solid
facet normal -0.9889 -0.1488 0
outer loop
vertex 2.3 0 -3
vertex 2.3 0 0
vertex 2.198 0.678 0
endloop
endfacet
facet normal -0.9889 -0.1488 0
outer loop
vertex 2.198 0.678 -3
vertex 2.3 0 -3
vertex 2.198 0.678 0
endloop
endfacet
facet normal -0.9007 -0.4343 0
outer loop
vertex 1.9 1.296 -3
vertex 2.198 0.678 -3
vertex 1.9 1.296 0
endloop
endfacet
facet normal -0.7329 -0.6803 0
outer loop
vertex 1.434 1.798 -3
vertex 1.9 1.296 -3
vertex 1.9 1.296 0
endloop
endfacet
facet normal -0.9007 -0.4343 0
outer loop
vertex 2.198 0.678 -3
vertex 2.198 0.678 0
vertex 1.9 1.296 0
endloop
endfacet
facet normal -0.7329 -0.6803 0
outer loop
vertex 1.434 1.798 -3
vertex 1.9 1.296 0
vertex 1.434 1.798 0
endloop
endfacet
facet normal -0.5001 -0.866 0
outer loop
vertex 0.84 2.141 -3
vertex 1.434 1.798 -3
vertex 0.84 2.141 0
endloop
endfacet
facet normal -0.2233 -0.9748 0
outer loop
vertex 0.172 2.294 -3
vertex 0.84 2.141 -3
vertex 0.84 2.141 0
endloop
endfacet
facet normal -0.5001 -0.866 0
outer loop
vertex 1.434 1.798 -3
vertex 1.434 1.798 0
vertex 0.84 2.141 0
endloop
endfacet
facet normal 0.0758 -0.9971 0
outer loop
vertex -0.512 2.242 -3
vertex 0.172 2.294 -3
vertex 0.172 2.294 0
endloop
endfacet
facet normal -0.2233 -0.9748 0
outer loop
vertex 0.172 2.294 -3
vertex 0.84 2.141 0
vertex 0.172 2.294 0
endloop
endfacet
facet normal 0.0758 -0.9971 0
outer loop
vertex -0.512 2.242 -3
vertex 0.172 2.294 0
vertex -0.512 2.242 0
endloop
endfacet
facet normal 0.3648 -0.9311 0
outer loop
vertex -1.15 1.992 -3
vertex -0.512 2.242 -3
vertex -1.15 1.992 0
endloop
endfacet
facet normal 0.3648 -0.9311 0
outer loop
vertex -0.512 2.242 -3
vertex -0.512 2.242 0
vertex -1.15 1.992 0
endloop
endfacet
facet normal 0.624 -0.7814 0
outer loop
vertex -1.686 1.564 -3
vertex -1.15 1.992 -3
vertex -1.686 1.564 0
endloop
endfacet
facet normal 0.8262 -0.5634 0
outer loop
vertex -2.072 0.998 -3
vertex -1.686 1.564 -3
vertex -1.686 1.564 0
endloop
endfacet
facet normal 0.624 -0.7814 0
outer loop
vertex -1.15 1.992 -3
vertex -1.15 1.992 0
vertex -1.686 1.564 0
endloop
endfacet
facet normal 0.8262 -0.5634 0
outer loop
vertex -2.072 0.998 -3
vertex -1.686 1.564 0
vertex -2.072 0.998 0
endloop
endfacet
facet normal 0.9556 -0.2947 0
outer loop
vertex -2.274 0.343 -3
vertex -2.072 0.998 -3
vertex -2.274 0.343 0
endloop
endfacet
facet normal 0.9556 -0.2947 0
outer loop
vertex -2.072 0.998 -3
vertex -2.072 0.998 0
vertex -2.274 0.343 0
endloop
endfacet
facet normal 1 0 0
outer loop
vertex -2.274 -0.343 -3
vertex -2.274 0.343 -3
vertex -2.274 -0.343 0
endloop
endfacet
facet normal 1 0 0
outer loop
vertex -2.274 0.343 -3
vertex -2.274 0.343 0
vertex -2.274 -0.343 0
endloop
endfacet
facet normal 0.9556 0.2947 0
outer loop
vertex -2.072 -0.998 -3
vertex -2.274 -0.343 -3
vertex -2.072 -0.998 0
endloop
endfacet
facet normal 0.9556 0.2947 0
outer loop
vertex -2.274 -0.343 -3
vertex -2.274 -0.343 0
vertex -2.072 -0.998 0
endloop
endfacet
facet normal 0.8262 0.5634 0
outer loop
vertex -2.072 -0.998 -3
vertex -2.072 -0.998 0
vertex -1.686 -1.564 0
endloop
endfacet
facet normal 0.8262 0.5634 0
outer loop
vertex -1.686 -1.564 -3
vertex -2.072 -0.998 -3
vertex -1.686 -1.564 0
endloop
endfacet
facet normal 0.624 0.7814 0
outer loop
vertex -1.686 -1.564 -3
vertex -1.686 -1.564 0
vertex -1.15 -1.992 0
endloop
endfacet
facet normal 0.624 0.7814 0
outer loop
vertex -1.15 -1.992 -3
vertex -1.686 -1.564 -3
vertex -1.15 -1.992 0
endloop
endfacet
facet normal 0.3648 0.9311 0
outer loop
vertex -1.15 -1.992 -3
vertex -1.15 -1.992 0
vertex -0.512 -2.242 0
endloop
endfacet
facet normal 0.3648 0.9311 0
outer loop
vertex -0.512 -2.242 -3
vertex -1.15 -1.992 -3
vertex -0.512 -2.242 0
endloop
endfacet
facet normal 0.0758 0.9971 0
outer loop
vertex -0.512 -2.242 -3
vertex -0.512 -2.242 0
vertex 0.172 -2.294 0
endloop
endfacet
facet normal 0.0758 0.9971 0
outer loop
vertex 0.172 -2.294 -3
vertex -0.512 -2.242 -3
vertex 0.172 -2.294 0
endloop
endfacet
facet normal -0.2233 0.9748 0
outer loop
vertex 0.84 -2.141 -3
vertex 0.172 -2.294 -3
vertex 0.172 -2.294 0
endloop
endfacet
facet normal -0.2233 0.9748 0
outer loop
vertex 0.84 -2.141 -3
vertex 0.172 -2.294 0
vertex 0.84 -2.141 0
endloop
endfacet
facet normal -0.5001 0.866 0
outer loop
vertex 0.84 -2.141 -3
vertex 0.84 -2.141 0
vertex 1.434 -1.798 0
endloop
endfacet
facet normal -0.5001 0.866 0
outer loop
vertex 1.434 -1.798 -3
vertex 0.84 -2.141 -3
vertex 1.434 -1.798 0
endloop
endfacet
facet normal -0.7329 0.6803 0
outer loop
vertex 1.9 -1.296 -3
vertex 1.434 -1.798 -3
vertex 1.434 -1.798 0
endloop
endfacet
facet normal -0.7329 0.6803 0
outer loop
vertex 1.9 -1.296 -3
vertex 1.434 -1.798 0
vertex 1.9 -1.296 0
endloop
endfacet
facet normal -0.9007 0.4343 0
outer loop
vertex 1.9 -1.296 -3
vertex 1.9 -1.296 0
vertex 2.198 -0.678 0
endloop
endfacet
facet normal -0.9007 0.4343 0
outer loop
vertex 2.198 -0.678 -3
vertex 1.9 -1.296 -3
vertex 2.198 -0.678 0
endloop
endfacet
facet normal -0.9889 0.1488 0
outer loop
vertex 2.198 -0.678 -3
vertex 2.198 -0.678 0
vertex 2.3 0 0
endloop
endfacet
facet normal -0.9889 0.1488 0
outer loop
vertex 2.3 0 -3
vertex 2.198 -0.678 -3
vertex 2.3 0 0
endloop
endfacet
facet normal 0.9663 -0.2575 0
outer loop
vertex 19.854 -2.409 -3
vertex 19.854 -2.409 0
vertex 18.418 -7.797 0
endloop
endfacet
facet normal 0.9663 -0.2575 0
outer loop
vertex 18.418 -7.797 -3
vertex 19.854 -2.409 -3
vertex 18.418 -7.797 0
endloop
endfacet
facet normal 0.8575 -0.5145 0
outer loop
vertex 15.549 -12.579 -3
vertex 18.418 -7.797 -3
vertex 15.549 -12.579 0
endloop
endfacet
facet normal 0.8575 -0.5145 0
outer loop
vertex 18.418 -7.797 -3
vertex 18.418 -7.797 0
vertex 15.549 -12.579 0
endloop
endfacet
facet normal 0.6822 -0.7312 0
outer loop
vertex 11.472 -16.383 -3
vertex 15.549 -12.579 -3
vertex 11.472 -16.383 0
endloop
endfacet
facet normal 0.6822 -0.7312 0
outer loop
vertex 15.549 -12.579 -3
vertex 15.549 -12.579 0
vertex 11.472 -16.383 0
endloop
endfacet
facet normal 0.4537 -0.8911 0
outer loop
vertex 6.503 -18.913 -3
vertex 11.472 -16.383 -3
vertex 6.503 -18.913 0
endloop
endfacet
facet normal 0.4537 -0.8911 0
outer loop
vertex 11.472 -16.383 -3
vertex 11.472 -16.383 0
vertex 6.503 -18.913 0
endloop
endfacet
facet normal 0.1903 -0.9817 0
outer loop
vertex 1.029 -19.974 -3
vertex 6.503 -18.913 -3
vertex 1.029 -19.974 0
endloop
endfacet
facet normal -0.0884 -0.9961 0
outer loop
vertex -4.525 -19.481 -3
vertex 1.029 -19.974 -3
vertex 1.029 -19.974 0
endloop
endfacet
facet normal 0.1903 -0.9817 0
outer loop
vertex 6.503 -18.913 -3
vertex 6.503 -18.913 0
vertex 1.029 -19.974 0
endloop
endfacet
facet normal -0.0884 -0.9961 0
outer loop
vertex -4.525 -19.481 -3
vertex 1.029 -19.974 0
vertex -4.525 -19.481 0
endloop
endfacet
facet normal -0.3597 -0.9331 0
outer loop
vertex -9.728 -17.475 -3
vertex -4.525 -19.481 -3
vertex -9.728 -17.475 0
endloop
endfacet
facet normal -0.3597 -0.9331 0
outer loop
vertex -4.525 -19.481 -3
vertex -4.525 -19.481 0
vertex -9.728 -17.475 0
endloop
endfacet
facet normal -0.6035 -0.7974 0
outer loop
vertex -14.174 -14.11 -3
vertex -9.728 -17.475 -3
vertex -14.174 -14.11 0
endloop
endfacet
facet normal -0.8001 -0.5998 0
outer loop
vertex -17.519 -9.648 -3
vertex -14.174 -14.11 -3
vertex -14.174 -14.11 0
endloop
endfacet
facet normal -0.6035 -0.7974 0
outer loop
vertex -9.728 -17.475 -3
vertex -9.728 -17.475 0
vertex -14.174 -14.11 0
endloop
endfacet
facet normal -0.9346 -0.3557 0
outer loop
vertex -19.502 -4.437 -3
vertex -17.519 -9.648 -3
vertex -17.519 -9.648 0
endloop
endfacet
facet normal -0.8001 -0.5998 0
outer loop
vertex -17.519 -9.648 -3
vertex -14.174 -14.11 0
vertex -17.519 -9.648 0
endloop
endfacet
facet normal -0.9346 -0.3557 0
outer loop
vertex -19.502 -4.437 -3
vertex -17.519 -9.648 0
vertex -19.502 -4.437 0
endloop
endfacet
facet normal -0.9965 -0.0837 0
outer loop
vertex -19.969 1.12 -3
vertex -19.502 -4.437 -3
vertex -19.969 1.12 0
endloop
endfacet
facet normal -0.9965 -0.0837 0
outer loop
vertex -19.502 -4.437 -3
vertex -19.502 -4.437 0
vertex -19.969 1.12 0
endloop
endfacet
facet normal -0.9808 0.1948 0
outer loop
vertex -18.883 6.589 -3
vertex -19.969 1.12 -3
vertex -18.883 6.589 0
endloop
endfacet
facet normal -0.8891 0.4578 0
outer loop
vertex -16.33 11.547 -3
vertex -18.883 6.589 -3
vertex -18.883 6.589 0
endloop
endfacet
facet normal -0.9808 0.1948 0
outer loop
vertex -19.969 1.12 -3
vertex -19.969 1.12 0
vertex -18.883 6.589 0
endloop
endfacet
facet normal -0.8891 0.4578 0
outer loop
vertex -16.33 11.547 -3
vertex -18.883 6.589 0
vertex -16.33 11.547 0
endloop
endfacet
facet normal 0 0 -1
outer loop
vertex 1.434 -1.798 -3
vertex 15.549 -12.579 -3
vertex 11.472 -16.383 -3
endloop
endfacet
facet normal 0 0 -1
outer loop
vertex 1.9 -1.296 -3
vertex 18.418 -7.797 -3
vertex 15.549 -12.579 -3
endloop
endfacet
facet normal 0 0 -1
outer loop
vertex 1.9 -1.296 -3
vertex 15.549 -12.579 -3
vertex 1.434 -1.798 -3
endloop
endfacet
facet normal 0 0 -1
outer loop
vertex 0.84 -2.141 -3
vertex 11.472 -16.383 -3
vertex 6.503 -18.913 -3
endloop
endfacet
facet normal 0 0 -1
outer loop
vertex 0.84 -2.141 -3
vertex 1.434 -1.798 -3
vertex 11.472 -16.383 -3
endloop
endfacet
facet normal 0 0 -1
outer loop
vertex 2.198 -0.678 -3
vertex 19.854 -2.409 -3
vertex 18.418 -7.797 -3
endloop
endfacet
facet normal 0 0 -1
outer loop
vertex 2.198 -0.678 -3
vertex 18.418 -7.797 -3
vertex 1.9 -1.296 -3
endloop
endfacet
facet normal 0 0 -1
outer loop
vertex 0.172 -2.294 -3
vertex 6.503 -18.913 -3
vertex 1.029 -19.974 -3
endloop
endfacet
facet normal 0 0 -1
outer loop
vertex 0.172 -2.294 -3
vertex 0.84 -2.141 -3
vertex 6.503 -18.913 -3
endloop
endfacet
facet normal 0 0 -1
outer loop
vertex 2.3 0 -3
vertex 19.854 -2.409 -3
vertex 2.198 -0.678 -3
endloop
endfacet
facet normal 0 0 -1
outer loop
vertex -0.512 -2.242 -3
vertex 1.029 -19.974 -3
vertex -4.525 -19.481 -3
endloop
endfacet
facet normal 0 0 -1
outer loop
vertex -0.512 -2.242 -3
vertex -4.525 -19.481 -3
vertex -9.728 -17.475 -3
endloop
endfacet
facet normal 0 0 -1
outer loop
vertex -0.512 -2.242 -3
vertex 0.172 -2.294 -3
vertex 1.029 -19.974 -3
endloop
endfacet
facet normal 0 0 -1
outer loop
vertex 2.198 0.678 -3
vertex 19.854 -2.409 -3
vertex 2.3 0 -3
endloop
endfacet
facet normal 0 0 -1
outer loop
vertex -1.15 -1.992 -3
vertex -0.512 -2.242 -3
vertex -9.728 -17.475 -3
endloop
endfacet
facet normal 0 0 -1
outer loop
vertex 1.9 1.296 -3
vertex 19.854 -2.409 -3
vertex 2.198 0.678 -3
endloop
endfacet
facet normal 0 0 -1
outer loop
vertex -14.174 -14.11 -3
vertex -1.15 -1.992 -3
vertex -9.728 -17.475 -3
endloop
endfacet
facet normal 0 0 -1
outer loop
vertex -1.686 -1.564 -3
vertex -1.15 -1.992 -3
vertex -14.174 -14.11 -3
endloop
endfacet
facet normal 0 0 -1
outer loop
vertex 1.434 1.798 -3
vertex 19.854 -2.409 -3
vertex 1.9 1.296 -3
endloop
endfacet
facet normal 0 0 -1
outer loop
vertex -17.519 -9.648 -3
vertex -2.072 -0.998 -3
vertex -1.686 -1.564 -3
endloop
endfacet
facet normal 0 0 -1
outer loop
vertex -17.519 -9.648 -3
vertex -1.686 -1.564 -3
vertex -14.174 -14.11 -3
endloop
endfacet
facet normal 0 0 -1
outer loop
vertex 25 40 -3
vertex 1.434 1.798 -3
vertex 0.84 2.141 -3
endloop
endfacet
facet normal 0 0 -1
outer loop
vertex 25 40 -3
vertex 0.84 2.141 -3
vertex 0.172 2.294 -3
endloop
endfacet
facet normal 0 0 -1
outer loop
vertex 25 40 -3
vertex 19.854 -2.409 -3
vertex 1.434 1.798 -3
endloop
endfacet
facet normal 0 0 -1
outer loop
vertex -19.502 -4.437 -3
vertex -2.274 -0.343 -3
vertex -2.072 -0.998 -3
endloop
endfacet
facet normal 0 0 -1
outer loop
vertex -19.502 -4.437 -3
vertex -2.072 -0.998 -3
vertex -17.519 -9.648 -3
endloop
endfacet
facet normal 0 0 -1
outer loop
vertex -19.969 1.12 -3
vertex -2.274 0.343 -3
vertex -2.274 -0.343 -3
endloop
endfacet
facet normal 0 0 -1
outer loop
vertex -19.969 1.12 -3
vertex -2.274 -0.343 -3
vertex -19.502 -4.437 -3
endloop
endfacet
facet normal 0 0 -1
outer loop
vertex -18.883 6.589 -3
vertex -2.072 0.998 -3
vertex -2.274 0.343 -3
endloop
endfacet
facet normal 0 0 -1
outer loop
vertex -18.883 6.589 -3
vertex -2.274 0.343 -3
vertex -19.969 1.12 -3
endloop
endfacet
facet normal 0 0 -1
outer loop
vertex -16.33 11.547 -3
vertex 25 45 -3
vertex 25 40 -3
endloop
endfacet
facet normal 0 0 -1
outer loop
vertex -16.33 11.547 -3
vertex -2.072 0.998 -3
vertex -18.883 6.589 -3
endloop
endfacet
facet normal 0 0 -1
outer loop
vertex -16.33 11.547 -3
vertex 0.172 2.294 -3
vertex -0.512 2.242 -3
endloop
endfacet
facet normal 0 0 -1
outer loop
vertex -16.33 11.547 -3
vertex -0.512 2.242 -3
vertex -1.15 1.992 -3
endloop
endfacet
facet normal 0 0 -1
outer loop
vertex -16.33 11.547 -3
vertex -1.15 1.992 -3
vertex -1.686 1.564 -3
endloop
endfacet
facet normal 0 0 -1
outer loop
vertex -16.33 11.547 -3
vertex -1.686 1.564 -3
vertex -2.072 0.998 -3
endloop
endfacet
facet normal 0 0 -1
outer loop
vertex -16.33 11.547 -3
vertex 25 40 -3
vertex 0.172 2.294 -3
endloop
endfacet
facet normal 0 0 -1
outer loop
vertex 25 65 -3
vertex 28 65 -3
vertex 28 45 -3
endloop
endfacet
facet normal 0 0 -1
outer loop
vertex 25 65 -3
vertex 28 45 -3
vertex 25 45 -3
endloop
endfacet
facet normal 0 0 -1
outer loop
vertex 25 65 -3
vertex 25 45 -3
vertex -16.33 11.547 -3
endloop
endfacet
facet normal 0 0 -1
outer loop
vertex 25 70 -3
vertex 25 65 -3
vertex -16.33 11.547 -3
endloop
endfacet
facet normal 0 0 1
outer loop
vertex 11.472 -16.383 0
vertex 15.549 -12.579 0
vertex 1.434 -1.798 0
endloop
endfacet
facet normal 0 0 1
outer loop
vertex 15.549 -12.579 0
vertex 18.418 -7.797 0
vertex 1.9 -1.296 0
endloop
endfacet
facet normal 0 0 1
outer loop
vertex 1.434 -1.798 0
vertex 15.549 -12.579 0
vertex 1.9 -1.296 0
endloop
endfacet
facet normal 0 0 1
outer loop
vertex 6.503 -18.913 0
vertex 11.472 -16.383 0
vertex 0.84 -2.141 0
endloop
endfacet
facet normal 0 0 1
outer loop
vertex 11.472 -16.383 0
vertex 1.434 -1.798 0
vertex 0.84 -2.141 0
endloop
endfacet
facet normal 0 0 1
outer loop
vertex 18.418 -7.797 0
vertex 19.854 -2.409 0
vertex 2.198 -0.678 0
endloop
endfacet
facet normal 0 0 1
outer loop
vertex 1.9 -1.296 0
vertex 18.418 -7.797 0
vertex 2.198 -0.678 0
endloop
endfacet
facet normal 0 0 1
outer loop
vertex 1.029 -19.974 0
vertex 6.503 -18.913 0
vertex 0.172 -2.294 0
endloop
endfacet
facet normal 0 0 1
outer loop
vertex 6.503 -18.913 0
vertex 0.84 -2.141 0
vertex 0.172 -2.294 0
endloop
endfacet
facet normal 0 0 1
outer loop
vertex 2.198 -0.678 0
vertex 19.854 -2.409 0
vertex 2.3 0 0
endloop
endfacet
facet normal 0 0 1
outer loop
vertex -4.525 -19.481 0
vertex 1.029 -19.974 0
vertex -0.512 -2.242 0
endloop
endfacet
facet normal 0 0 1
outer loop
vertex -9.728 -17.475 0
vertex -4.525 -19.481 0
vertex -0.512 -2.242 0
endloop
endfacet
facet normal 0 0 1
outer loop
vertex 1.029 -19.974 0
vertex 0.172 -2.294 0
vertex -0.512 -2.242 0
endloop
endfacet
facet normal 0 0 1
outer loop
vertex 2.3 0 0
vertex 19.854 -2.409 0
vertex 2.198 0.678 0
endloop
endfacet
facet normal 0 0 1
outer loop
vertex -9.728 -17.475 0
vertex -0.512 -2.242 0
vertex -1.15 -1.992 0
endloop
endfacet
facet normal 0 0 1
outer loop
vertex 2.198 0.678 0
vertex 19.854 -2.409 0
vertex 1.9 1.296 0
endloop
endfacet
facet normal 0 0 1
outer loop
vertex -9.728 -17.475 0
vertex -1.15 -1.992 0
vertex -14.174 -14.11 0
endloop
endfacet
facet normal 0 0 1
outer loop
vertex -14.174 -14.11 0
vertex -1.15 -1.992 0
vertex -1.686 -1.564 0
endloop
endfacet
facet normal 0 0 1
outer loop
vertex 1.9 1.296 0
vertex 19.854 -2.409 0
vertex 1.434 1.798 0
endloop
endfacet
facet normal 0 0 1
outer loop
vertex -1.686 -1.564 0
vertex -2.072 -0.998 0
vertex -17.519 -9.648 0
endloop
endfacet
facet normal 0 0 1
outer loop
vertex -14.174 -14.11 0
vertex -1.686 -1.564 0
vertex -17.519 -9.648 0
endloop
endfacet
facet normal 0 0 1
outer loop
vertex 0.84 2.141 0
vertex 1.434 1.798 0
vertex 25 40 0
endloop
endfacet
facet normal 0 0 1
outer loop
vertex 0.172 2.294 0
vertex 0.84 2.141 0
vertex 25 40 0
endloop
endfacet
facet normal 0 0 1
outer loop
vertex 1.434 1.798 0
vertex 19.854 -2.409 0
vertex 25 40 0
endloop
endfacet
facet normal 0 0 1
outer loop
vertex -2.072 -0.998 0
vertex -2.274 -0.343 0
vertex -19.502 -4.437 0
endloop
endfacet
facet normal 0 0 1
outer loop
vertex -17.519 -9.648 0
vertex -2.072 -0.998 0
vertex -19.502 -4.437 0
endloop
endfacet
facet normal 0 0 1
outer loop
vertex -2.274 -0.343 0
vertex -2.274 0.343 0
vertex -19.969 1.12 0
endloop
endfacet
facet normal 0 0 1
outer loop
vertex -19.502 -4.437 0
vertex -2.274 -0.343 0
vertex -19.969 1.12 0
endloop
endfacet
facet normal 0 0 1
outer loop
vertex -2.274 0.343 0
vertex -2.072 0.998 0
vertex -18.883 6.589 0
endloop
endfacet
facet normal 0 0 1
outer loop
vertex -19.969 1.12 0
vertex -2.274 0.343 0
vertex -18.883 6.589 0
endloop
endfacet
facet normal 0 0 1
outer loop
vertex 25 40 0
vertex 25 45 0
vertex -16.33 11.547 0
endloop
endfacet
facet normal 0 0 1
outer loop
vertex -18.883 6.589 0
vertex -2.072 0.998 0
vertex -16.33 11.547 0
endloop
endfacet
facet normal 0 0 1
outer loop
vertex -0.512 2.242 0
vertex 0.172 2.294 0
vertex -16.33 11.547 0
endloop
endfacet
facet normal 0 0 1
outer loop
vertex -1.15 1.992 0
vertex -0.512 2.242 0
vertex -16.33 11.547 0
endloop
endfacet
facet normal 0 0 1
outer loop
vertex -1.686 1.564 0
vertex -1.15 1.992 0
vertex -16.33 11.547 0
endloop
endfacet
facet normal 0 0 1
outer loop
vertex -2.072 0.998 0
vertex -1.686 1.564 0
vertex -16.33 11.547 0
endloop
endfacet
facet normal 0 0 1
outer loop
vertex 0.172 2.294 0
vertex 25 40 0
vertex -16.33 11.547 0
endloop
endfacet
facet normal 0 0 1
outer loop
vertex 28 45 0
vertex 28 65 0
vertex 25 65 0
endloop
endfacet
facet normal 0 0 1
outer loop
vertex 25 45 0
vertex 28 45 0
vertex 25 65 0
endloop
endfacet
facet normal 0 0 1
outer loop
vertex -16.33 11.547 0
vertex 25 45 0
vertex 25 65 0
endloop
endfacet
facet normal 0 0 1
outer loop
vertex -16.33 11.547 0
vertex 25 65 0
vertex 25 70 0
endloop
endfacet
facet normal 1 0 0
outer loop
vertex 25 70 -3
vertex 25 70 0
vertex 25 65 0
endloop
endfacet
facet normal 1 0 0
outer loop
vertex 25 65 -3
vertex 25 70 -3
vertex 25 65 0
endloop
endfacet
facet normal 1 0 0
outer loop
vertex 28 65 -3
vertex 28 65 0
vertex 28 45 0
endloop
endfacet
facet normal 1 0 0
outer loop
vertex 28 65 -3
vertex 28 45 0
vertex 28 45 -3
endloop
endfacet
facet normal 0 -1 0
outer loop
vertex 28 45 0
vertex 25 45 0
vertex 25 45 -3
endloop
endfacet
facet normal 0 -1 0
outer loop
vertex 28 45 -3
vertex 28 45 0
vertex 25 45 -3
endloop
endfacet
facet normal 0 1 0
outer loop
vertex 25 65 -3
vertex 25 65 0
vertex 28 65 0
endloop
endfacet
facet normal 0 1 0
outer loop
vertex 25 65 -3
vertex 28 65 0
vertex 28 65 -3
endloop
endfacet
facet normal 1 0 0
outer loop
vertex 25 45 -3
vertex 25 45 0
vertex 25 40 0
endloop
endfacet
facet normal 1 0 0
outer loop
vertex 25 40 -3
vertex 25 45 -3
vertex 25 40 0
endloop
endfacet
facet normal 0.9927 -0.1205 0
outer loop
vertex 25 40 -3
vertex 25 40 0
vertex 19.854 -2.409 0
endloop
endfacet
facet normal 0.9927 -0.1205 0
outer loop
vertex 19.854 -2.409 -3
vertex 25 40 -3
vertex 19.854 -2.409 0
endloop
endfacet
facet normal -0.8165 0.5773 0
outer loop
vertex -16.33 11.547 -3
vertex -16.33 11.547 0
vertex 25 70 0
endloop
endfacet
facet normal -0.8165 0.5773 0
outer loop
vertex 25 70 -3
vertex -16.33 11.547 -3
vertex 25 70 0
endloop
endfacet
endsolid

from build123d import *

# Parameters (mm, degrees)
BOSS_EXTRUDE1_DEPTH = 3
SKETCH2_R           = 2.3
CUT_EXTRUDE1_DEPTH  = 10
SKETCH4_W           = 3
SKETCH4_H           = 20
BOSS_EXTRUDE3_DEPTH = 3


with BuildPart() as part:
    # Sketch1 → Boss-Extrude1 (new body)
    with BuildSketch(Plane.XY):
        with BuildLine():
            Line((-16.33027103, 11.546525368), (25, 70))
            Line((25, 70), (25, 40))
            Line((25, 40), (19.854388756, -2.408992972))
            ThreePointArc((19.854388756, -2.408992972), (-7.196803073, -18.660279353), (-16.33027103, 11.546525368))
        make_face()
    extrude(amount=-BOSS_EXTRUDE1_DEPTH)

    # Sketch2 → Cut-Extrude1 (cut)
    with BuildSketch(Plane.XY):
        Circle(SKETCH2_R)
    extrude(amount=-CUT_EXTRUDE1_DEPTH, mode=Mode.SUBTRACT)

    # Sketch4 → Boss-Extrude3 (add)
    with BuildSketch(Plane(origin=(25, 0, 0), x_dir=(0, 0, -1), z_dir=(1, 0, 0))):
        with Locations((1.5, 55)):
            Rectangle(SKETCH4_W, SKETCH4_H)
    extrude(amount=BOSS_EXTRUDE3_DEPTH)


solid = part.part
